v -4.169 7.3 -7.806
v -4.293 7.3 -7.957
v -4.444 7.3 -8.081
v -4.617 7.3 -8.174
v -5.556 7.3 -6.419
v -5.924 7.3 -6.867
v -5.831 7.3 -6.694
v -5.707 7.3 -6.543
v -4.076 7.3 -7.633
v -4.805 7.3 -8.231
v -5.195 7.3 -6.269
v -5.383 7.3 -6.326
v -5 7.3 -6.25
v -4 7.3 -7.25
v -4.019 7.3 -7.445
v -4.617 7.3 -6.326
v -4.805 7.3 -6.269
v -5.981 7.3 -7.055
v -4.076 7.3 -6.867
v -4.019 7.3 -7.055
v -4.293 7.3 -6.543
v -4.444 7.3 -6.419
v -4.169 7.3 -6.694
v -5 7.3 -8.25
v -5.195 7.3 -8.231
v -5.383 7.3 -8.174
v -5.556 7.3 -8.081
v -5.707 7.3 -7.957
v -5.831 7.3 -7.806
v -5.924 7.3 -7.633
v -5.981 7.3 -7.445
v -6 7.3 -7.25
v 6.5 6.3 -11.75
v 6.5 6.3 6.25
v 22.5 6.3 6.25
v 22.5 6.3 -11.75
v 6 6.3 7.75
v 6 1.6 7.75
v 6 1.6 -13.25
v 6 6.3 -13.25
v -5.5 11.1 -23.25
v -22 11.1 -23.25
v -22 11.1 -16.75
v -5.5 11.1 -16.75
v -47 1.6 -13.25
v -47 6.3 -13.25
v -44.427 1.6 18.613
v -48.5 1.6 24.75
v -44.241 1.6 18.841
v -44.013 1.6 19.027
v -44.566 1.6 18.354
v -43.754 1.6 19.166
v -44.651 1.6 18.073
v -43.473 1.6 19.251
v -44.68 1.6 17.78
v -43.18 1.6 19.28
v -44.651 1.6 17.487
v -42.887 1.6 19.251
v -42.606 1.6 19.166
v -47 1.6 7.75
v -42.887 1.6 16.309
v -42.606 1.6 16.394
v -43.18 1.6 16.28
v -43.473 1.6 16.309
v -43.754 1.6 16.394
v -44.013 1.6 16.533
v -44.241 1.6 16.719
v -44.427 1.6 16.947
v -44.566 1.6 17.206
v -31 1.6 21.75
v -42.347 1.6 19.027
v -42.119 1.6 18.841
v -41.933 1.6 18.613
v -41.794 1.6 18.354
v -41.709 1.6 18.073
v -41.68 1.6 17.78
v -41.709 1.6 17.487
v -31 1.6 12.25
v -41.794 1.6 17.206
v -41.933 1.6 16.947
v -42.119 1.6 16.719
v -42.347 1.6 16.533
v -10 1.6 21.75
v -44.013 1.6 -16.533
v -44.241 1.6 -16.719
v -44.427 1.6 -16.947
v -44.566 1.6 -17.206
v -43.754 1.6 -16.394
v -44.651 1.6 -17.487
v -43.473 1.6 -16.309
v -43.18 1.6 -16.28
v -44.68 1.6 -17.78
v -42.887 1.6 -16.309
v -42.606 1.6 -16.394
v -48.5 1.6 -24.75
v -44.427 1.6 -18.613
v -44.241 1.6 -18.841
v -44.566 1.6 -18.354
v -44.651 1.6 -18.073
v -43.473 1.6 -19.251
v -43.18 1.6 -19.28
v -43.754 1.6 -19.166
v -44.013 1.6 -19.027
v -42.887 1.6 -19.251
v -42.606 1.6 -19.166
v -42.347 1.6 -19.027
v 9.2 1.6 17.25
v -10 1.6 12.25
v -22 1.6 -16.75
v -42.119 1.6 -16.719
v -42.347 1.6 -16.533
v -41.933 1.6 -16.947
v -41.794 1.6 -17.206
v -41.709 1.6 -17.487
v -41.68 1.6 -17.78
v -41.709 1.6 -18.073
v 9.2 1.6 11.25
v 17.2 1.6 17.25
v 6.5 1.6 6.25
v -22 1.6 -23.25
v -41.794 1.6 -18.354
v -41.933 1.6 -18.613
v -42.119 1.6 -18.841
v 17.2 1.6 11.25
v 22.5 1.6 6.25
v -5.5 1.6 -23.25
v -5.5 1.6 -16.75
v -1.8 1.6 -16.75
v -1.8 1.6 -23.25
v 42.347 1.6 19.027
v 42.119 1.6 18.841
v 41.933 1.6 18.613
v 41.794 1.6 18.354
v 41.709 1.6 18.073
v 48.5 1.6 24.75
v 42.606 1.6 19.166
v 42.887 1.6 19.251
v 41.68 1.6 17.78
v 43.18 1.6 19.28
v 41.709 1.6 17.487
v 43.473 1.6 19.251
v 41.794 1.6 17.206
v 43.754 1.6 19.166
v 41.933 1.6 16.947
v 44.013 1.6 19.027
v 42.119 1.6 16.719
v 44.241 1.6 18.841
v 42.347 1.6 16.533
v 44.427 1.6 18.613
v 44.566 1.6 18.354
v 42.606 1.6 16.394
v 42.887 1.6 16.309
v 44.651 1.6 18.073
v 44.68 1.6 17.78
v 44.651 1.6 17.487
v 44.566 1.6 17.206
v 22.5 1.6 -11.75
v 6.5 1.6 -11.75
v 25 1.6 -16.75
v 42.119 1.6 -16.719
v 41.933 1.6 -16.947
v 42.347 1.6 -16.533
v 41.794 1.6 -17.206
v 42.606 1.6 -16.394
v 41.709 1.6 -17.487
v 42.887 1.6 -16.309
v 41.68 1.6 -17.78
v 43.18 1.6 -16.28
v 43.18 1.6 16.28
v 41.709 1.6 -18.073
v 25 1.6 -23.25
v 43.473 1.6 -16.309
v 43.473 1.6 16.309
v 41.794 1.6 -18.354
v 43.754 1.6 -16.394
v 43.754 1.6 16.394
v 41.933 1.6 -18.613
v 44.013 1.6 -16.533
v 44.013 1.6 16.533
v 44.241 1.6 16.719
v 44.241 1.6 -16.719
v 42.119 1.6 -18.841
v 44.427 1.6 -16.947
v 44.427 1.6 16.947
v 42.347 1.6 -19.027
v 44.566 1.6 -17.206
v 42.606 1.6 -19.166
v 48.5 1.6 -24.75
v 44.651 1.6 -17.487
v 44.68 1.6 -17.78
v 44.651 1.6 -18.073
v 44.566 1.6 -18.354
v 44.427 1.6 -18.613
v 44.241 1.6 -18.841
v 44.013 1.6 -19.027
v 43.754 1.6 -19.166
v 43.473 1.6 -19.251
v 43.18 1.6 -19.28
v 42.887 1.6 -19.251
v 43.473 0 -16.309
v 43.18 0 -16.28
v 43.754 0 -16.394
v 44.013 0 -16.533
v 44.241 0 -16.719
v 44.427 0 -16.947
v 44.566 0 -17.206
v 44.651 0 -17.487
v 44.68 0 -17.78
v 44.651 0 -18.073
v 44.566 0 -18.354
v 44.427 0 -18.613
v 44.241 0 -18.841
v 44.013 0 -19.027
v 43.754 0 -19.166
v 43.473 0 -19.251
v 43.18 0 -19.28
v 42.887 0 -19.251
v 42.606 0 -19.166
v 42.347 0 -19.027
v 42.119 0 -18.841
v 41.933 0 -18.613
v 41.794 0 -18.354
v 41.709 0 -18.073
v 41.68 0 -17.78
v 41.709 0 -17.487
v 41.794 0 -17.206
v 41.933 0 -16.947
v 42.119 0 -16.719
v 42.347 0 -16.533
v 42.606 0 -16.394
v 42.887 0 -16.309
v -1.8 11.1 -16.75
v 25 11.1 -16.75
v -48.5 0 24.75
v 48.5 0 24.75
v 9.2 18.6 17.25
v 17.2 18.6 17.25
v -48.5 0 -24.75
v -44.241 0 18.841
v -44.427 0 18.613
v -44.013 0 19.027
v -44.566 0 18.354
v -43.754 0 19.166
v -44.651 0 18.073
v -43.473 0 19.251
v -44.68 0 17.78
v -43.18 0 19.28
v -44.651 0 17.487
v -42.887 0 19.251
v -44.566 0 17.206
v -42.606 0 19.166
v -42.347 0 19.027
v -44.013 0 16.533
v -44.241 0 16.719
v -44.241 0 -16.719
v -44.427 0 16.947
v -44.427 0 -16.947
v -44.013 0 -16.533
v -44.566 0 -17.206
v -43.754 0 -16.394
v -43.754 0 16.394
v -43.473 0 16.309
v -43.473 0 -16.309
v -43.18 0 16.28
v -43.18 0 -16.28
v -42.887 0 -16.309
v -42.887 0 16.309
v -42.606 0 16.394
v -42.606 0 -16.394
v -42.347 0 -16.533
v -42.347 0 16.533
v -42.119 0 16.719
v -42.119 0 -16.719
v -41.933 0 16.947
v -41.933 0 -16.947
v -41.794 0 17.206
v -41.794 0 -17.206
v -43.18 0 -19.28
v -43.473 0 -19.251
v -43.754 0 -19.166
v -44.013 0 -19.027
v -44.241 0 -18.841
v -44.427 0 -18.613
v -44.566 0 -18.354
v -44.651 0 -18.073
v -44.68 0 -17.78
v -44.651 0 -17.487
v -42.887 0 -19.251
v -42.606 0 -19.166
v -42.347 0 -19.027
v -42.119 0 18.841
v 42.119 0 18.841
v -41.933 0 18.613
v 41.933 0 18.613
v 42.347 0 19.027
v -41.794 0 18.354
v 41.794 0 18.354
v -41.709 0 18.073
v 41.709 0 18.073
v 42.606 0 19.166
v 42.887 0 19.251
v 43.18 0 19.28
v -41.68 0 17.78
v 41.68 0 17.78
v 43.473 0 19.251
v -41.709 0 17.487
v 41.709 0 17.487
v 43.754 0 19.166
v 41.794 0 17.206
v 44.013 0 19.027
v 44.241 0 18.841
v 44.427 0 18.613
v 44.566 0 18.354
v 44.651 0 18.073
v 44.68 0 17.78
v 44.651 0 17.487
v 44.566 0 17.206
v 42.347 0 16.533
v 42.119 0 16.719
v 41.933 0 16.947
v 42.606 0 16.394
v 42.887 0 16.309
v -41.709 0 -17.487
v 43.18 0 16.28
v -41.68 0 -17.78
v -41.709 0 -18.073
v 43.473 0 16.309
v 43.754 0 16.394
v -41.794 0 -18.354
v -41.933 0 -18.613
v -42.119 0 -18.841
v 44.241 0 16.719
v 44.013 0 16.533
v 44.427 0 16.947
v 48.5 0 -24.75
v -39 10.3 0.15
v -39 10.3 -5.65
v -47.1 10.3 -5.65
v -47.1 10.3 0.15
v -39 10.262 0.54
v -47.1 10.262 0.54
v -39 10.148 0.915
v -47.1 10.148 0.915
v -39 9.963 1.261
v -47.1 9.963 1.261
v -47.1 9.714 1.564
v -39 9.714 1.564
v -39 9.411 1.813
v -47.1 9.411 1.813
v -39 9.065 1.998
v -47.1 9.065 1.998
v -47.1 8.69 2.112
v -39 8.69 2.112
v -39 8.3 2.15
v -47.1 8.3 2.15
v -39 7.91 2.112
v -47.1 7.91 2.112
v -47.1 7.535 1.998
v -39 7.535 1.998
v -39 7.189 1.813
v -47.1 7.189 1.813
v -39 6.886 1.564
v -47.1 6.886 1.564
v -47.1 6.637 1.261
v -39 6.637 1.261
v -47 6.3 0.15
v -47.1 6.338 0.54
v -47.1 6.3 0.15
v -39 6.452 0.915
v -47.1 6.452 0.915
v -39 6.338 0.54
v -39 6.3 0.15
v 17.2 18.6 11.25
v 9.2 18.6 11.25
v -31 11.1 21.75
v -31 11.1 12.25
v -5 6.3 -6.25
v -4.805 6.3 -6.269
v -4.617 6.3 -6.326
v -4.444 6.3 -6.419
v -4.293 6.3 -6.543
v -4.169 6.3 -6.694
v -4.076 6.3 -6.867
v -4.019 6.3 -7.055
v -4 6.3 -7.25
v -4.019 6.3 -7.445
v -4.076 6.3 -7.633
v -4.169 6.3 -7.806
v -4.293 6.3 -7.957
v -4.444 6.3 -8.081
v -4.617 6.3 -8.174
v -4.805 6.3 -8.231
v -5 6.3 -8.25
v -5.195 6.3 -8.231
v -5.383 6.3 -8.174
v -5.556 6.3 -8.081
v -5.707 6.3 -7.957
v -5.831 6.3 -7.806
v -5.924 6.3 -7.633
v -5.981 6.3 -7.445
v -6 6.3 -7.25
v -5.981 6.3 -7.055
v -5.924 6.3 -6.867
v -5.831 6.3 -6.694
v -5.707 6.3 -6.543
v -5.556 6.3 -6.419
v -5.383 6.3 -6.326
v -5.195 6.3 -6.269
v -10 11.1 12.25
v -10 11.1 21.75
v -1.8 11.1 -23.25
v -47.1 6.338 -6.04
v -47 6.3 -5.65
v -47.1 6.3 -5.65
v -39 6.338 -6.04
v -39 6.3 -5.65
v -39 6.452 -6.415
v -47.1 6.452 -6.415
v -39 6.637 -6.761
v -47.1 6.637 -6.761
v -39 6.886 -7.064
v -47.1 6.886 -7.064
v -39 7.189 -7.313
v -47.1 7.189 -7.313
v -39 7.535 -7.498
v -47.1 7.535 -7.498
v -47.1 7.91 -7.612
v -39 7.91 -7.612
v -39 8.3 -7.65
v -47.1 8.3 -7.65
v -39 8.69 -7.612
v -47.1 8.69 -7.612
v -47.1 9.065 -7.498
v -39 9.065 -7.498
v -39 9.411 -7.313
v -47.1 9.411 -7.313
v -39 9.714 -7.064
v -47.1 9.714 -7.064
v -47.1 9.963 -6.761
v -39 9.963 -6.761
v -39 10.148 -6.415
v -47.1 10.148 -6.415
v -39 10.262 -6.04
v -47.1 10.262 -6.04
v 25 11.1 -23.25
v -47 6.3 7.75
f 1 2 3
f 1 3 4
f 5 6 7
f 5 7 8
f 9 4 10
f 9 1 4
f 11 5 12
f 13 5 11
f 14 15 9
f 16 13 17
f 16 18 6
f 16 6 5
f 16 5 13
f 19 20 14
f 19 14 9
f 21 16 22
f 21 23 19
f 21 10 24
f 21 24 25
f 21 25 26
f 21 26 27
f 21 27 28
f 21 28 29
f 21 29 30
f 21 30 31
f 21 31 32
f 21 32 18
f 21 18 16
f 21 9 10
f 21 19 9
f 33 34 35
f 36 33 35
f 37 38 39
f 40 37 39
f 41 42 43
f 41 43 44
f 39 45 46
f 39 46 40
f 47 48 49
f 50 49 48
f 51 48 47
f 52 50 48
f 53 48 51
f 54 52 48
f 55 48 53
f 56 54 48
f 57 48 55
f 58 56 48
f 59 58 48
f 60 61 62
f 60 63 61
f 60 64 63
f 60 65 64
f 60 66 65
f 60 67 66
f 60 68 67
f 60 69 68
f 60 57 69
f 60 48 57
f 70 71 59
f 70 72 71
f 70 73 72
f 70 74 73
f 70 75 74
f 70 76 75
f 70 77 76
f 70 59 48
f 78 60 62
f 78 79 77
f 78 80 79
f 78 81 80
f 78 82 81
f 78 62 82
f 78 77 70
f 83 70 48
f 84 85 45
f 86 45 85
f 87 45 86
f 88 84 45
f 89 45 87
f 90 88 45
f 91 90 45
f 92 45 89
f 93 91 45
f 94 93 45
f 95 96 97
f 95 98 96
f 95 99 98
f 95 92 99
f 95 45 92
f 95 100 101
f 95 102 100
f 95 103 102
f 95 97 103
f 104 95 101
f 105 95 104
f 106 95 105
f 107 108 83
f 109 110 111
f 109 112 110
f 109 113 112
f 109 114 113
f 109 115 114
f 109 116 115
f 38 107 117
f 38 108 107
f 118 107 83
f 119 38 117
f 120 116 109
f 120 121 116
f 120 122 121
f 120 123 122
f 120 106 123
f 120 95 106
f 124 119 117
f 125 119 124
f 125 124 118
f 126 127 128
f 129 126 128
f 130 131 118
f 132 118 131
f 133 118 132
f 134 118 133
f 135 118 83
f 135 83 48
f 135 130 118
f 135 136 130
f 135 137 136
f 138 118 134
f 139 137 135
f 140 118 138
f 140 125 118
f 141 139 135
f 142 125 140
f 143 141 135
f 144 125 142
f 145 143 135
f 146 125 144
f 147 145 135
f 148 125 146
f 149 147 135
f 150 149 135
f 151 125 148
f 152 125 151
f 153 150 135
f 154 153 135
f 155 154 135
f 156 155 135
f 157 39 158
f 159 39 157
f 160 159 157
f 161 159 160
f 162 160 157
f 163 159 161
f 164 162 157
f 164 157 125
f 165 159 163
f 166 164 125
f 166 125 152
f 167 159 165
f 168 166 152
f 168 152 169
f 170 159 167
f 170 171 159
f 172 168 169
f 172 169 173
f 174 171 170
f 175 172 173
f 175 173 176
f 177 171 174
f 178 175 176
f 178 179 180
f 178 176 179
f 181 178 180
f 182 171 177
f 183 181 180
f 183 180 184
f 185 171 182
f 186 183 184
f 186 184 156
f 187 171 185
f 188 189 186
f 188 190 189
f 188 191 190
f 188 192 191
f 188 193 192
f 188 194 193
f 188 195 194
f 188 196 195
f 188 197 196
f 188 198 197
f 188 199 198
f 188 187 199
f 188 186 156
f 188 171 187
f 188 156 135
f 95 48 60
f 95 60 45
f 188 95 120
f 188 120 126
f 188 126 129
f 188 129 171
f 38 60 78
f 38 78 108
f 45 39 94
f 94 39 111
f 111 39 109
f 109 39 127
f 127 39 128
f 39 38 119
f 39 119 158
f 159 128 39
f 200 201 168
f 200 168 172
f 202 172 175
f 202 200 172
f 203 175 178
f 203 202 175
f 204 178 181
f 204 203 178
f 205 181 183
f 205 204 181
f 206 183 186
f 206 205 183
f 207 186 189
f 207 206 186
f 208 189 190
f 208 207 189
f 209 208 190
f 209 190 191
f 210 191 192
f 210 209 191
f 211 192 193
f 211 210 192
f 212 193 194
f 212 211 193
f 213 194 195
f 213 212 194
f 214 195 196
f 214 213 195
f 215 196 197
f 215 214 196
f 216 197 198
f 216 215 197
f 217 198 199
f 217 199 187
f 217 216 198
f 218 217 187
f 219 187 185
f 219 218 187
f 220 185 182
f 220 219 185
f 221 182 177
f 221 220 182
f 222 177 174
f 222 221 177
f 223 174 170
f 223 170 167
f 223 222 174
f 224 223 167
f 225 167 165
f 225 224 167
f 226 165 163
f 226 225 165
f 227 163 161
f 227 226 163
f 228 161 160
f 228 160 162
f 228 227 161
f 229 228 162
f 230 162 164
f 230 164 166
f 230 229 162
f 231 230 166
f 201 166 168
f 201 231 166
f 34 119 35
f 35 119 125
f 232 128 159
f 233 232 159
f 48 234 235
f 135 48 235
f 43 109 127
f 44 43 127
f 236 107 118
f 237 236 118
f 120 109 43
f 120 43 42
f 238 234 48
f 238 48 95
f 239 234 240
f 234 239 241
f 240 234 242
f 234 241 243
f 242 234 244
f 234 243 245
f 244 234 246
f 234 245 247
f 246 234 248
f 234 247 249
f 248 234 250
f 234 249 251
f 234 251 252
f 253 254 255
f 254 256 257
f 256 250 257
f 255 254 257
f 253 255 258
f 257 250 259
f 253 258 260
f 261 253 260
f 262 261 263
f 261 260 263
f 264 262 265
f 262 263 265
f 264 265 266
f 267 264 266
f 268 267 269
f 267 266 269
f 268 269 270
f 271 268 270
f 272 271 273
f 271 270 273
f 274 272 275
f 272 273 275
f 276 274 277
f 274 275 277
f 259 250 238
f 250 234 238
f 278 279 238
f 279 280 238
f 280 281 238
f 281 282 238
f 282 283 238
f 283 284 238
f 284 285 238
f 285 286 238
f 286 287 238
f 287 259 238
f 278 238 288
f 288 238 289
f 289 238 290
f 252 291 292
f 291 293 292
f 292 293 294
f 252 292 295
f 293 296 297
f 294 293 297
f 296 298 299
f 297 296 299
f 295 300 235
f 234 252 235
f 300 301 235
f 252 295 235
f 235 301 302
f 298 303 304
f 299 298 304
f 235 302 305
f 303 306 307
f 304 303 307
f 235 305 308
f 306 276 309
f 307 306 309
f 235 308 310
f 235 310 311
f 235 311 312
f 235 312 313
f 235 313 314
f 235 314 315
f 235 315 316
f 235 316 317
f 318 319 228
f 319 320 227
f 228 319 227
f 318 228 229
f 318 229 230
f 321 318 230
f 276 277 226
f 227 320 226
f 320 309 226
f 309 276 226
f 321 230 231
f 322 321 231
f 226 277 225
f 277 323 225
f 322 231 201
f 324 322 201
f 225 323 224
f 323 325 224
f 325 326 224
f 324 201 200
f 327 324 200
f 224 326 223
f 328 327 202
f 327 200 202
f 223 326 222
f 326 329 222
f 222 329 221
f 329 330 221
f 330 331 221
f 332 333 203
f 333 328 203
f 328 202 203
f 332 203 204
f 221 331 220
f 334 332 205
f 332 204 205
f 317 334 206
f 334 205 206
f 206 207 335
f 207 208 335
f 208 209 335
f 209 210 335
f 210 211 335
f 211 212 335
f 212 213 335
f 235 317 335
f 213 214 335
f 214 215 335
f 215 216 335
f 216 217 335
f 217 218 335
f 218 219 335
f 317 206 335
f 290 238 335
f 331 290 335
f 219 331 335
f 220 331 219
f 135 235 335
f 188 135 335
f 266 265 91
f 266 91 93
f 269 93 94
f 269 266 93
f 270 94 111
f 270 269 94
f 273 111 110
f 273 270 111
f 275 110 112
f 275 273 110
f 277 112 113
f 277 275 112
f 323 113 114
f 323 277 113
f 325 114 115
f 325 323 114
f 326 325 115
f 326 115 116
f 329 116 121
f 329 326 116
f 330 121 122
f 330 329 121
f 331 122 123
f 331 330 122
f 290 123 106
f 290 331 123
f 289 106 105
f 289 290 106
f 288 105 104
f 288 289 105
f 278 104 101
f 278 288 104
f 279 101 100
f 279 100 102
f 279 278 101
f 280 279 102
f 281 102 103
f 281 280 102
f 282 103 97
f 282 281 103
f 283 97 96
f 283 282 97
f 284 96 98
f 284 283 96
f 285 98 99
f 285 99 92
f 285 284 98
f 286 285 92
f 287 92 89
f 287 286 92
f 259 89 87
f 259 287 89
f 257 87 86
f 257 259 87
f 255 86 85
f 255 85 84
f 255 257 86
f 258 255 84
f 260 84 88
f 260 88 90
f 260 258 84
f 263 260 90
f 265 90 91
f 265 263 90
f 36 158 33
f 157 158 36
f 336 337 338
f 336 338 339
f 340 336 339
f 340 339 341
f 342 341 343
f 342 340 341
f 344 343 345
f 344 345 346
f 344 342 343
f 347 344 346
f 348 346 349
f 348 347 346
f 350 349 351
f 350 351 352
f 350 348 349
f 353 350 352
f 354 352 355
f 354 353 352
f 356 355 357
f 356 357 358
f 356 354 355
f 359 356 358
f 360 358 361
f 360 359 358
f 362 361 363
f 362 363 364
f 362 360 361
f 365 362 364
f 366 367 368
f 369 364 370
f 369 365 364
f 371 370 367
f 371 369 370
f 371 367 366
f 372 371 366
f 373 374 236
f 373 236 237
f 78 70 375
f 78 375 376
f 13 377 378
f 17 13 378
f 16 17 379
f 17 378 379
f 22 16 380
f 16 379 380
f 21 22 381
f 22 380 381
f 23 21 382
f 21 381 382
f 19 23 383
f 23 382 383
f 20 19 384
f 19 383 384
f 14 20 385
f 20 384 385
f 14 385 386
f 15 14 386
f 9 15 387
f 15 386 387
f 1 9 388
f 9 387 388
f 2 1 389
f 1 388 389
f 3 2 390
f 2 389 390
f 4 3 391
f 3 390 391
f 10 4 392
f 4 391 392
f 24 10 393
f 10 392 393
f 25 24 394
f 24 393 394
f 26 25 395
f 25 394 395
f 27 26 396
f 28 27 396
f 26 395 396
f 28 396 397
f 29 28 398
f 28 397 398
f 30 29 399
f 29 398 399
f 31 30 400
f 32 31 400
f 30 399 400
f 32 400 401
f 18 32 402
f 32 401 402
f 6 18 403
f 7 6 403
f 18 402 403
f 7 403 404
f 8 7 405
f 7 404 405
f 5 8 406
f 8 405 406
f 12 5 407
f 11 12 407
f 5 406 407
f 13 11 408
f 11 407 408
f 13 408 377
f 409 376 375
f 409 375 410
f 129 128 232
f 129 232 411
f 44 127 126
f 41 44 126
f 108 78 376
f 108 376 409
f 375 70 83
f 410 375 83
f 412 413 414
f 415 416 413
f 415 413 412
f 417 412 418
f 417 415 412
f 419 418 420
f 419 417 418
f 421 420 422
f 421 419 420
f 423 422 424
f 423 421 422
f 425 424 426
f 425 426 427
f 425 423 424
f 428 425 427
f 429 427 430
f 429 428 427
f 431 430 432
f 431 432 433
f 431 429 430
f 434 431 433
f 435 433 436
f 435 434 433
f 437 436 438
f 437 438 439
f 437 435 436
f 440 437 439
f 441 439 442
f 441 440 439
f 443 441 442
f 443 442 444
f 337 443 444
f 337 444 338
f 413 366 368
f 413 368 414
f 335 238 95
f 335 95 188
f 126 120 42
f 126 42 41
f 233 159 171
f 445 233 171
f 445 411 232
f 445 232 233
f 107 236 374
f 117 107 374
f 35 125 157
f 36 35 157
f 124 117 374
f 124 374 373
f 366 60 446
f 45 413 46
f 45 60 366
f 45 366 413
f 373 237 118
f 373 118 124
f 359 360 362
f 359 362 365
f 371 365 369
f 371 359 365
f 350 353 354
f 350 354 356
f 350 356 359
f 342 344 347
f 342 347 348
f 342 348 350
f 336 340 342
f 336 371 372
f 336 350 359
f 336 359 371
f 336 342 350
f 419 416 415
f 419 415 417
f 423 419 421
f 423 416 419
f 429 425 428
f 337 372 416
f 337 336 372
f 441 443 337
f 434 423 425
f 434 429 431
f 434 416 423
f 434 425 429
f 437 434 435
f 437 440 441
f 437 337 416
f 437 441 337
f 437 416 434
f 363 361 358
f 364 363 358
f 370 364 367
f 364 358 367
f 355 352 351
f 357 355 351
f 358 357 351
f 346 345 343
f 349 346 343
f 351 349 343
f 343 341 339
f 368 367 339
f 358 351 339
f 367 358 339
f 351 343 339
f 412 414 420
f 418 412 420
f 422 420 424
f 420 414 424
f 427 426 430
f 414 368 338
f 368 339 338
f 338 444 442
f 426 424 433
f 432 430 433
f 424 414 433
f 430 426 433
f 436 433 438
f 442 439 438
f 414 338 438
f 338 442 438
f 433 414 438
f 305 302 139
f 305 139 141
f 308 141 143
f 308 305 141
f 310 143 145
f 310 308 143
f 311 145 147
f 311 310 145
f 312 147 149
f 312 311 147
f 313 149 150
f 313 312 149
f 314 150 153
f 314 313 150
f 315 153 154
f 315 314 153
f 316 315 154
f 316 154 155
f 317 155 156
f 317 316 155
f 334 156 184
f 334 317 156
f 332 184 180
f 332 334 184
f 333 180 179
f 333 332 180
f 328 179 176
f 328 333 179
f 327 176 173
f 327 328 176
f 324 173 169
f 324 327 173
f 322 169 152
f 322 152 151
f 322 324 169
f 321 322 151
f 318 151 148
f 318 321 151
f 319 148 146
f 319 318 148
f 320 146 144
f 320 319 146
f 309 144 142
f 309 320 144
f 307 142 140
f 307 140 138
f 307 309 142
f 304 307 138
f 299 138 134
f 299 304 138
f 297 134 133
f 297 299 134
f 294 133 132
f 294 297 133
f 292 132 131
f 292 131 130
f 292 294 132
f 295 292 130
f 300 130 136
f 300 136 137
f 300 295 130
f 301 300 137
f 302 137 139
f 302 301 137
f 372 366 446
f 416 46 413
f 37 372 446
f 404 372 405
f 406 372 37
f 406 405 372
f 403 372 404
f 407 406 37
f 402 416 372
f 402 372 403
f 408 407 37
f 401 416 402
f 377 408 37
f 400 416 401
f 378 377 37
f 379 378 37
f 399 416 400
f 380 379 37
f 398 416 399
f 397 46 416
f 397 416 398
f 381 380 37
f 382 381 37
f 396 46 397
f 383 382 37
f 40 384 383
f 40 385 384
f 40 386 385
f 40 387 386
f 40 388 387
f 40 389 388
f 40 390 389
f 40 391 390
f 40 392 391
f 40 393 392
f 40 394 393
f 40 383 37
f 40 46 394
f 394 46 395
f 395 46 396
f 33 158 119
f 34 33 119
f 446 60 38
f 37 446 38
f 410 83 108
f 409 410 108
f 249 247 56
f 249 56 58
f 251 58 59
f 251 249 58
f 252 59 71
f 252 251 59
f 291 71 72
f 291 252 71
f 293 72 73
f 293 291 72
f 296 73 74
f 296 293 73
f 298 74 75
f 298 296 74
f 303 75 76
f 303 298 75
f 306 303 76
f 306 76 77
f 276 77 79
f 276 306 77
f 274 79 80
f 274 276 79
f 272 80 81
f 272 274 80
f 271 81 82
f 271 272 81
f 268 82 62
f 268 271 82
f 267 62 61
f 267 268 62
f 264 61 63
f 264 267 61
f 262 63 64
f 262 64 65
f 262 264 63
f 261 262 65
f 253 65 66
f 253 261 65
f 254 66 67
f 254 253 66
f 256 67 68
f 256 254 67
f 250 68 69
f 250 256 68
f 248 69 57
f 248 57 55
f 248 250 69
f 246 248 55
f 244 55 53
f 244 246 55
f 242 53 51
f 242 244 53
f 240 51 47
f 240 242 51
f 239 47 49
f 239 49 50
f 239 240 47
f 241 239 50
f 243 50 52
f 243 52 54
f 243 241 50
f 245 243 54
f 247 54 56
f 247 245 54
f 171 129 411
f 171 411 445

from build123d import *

# Parameters (mm, degrees)
SKETCH1_W                = 97
SKETCH1_H                = 49.5
SKETCH1_R                = 1.5
BOSS_EXTRUDE1_DEPTH      = 1.6
SKETCH2_W                = 16.5
SKETCH2_H                = 6.5
SKETCH2_W_2              = 26.8
SKETCH2_W_3              = 21
SKETCH2_H_2              = 9.5
BOSS_EXTRUDE2_DEPTH      = 9.5
SKETCH2_3_W              = 16
SKETCH2_3_H              = 18
SKETCH2_3_W_2            = 53
SKETCH2_3_H_2            = 21
BOSS_EXTRUDE3_DEPTH      = 4.7
SKETCH2_4_W              = 8
SKETCH2_4_H              = 6
BOSS_EXTRUDE4_DEPTH      = 17
SKETCH3_R                = 1
BOSS_EXTRUDE5_DEPTH      = 1
BOSS_EXTRUDE6_DEPTH      = 0.1
BOSS_EXTRUDE6_DEPTH_BACK = 8


with BuildPart() as part:
    # Sketch1 → Boss-Extrude1 (new body)
    with BuildSketch(Plane(origin=(0, 0, 0), x_dir=(1, 0, 0), z_dir=(0, 1, 0))):
        Rectangle(SKETCH1_W, SKETCH1_H)
        with Locations((-43.18, 17.78)):
            Circle(SKETCH1_R, mode=Mode.SUBTRACT)
        with Locations((-43.18, -17.78)):
            Circle(SKETCH1_R, mode=Mode.SUBTRACT)
        with Locations((43.18, 17.78)):
            Circle(SKETCH1_R, mode=Mode.SUBTRACT)
        with Locations((43.18, -17.78)):
            Circle(SKETCH1_R, mode=Mode.SUBTRACT)
    extrude(amount=BOSS_EXTRUDE1_DEPTH)

    # Sketch2 → Boss-Extrude2 (add)
    with BuildSketch(Plane(origin=(0, 1.6, 0), x_dir=(1, 0, 0), z_dir=(0, 1, 0))):
        with Locations((-13.75, 20)):
            Rectangle(SKETCH2_W, SKETCH2_H)
        with Locations((11.6, 20)):
            Rectangle(SKETCH2_W_2, SKETCH2_H)
        with Locations((-20.5, -17)):
            Rectangle(SKETCH2_W_3, SKETCH2_H_2)
    extrude(amount=BOSS_EXTRUDE2_DEPTH)

    # Sketch2<3> → Boss-Extrude3 (add)
    with BuildSketch(Plane(origin=(0, 1.6, 0), x_dir=(1, 0, 0), z_dir=(0, 1, 0))):
        with Locations((14.5, 2.75)):
            Rectangle(SKETCH2_3_W, SKETCH2_3_H)
        with Locations((-20.5, 2.75)):
            Rectangle(SKETCH2_3_W_2, SKETCH2_3_H_2)
    extrude(amount=BOSS_EXTRUDE3_DEPTH)

    # Sketch2<4> → Boss-Extrude4 (add)
    with BuildSketch(Plane(origin=(0, 1.6, 0), x_dir=(1, 0, 0), z_dir=(0, 1, 0))):
        with Locations((13.2, -14.25)):
            Rectangle(SKETCH2_4_W, SKETCH2_4_H)
    extrude(amount=BOSS_EXTRUDE4_DEPTH)

    # Sketch3 → Boss-Extrude5 (add)
    with BuildSketch(Plane(origin=(0, 6.3, 0), x_dir=(1, 0, 0), z_dir=(0, 1, 0))):
        with Locations((-5, 7.25)):
            Circle(SKETCH3_R)
    extrude(amount=BOSS_EXTRUDE5_DEPTH)

    # Sketch4 → Boss-Extrude6 (add, two sides: drawn at the far end of the back side and taken through both)
    with BuildSketch(Plane.ZY.offset(47).offset(-BOSS_EXTRUDE6_DEPTH_BACK)):
        with BuildLine():
            Line((-5.65, 10.3), (0.15, 10.3))
            ThreePointArc((0.15, 10.3), (2.15, 8.3), (0.15, 6.3))
            Line((0.15, 6.3), (-5.65, 6.3))
            ThreePointArc((-5.65, 6.3), (-7.65, 8.3), (-5.65, 10.3))
        make_face()
    extrude(amount=BOSS_EXTRUDE6_DEPTH + BOSS_EXTRUDE6_DEPTH_BACK)


solid = part.part
